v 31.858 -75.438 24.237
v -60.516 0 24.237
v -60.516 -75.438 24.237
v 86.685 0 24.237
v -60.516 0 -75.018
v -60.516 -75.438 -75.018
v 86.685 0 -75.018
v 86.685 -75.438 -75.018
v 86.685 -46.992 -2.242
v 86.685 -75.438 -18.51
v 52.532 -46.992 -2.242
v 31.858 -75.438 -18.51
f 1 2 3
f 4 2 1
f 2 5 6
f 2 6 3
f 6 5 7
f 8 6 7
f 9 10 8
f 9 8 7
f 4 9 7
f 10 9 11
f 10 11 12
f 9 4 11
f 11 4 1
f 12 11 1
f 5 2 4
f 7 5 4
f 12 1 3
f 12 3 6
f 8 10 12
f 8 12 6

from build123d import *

# Parameters (mm, degrees)
F0_W     = 147.200812
F0_H     = 99.25572
F1_DEPTH = 75.438
F4_DEPTH = 44.704
F6_DEPTH = 65.278


with BuildPart() as f1:
    # F0 (on Front) → F1 (new body)
    with BuildSketch(Plane.XZ):
        with Locations((13.084514, -25.390397)):
            Rectangle(F0_W, F0_H)
    extrude(amount=F1_DEPTH)

    # F2 (on face) → F4 (cut)
    with BuildSketch(Plane.XY.offset(24.237463)):
        Polygon((86.68492, -75.438), (86.68492, 0), (31.858269, -75.438), align=None)
    extrude(amount=-F4_DEPTH, mode=Mode.SUBTRACT)

    # F5 (on face) → F6 (join)
    with BuildSketch(Plane.YZ.offset(86.68492)):
        Polygon((-46.992108, -2.242462), (-75.438, -18.509679), (-75.438, -23.966648), (0, -23.966648), (0, 24.237463), align=None)
    extrude(amount=-F6_DEPTH)


solid = f1.part
